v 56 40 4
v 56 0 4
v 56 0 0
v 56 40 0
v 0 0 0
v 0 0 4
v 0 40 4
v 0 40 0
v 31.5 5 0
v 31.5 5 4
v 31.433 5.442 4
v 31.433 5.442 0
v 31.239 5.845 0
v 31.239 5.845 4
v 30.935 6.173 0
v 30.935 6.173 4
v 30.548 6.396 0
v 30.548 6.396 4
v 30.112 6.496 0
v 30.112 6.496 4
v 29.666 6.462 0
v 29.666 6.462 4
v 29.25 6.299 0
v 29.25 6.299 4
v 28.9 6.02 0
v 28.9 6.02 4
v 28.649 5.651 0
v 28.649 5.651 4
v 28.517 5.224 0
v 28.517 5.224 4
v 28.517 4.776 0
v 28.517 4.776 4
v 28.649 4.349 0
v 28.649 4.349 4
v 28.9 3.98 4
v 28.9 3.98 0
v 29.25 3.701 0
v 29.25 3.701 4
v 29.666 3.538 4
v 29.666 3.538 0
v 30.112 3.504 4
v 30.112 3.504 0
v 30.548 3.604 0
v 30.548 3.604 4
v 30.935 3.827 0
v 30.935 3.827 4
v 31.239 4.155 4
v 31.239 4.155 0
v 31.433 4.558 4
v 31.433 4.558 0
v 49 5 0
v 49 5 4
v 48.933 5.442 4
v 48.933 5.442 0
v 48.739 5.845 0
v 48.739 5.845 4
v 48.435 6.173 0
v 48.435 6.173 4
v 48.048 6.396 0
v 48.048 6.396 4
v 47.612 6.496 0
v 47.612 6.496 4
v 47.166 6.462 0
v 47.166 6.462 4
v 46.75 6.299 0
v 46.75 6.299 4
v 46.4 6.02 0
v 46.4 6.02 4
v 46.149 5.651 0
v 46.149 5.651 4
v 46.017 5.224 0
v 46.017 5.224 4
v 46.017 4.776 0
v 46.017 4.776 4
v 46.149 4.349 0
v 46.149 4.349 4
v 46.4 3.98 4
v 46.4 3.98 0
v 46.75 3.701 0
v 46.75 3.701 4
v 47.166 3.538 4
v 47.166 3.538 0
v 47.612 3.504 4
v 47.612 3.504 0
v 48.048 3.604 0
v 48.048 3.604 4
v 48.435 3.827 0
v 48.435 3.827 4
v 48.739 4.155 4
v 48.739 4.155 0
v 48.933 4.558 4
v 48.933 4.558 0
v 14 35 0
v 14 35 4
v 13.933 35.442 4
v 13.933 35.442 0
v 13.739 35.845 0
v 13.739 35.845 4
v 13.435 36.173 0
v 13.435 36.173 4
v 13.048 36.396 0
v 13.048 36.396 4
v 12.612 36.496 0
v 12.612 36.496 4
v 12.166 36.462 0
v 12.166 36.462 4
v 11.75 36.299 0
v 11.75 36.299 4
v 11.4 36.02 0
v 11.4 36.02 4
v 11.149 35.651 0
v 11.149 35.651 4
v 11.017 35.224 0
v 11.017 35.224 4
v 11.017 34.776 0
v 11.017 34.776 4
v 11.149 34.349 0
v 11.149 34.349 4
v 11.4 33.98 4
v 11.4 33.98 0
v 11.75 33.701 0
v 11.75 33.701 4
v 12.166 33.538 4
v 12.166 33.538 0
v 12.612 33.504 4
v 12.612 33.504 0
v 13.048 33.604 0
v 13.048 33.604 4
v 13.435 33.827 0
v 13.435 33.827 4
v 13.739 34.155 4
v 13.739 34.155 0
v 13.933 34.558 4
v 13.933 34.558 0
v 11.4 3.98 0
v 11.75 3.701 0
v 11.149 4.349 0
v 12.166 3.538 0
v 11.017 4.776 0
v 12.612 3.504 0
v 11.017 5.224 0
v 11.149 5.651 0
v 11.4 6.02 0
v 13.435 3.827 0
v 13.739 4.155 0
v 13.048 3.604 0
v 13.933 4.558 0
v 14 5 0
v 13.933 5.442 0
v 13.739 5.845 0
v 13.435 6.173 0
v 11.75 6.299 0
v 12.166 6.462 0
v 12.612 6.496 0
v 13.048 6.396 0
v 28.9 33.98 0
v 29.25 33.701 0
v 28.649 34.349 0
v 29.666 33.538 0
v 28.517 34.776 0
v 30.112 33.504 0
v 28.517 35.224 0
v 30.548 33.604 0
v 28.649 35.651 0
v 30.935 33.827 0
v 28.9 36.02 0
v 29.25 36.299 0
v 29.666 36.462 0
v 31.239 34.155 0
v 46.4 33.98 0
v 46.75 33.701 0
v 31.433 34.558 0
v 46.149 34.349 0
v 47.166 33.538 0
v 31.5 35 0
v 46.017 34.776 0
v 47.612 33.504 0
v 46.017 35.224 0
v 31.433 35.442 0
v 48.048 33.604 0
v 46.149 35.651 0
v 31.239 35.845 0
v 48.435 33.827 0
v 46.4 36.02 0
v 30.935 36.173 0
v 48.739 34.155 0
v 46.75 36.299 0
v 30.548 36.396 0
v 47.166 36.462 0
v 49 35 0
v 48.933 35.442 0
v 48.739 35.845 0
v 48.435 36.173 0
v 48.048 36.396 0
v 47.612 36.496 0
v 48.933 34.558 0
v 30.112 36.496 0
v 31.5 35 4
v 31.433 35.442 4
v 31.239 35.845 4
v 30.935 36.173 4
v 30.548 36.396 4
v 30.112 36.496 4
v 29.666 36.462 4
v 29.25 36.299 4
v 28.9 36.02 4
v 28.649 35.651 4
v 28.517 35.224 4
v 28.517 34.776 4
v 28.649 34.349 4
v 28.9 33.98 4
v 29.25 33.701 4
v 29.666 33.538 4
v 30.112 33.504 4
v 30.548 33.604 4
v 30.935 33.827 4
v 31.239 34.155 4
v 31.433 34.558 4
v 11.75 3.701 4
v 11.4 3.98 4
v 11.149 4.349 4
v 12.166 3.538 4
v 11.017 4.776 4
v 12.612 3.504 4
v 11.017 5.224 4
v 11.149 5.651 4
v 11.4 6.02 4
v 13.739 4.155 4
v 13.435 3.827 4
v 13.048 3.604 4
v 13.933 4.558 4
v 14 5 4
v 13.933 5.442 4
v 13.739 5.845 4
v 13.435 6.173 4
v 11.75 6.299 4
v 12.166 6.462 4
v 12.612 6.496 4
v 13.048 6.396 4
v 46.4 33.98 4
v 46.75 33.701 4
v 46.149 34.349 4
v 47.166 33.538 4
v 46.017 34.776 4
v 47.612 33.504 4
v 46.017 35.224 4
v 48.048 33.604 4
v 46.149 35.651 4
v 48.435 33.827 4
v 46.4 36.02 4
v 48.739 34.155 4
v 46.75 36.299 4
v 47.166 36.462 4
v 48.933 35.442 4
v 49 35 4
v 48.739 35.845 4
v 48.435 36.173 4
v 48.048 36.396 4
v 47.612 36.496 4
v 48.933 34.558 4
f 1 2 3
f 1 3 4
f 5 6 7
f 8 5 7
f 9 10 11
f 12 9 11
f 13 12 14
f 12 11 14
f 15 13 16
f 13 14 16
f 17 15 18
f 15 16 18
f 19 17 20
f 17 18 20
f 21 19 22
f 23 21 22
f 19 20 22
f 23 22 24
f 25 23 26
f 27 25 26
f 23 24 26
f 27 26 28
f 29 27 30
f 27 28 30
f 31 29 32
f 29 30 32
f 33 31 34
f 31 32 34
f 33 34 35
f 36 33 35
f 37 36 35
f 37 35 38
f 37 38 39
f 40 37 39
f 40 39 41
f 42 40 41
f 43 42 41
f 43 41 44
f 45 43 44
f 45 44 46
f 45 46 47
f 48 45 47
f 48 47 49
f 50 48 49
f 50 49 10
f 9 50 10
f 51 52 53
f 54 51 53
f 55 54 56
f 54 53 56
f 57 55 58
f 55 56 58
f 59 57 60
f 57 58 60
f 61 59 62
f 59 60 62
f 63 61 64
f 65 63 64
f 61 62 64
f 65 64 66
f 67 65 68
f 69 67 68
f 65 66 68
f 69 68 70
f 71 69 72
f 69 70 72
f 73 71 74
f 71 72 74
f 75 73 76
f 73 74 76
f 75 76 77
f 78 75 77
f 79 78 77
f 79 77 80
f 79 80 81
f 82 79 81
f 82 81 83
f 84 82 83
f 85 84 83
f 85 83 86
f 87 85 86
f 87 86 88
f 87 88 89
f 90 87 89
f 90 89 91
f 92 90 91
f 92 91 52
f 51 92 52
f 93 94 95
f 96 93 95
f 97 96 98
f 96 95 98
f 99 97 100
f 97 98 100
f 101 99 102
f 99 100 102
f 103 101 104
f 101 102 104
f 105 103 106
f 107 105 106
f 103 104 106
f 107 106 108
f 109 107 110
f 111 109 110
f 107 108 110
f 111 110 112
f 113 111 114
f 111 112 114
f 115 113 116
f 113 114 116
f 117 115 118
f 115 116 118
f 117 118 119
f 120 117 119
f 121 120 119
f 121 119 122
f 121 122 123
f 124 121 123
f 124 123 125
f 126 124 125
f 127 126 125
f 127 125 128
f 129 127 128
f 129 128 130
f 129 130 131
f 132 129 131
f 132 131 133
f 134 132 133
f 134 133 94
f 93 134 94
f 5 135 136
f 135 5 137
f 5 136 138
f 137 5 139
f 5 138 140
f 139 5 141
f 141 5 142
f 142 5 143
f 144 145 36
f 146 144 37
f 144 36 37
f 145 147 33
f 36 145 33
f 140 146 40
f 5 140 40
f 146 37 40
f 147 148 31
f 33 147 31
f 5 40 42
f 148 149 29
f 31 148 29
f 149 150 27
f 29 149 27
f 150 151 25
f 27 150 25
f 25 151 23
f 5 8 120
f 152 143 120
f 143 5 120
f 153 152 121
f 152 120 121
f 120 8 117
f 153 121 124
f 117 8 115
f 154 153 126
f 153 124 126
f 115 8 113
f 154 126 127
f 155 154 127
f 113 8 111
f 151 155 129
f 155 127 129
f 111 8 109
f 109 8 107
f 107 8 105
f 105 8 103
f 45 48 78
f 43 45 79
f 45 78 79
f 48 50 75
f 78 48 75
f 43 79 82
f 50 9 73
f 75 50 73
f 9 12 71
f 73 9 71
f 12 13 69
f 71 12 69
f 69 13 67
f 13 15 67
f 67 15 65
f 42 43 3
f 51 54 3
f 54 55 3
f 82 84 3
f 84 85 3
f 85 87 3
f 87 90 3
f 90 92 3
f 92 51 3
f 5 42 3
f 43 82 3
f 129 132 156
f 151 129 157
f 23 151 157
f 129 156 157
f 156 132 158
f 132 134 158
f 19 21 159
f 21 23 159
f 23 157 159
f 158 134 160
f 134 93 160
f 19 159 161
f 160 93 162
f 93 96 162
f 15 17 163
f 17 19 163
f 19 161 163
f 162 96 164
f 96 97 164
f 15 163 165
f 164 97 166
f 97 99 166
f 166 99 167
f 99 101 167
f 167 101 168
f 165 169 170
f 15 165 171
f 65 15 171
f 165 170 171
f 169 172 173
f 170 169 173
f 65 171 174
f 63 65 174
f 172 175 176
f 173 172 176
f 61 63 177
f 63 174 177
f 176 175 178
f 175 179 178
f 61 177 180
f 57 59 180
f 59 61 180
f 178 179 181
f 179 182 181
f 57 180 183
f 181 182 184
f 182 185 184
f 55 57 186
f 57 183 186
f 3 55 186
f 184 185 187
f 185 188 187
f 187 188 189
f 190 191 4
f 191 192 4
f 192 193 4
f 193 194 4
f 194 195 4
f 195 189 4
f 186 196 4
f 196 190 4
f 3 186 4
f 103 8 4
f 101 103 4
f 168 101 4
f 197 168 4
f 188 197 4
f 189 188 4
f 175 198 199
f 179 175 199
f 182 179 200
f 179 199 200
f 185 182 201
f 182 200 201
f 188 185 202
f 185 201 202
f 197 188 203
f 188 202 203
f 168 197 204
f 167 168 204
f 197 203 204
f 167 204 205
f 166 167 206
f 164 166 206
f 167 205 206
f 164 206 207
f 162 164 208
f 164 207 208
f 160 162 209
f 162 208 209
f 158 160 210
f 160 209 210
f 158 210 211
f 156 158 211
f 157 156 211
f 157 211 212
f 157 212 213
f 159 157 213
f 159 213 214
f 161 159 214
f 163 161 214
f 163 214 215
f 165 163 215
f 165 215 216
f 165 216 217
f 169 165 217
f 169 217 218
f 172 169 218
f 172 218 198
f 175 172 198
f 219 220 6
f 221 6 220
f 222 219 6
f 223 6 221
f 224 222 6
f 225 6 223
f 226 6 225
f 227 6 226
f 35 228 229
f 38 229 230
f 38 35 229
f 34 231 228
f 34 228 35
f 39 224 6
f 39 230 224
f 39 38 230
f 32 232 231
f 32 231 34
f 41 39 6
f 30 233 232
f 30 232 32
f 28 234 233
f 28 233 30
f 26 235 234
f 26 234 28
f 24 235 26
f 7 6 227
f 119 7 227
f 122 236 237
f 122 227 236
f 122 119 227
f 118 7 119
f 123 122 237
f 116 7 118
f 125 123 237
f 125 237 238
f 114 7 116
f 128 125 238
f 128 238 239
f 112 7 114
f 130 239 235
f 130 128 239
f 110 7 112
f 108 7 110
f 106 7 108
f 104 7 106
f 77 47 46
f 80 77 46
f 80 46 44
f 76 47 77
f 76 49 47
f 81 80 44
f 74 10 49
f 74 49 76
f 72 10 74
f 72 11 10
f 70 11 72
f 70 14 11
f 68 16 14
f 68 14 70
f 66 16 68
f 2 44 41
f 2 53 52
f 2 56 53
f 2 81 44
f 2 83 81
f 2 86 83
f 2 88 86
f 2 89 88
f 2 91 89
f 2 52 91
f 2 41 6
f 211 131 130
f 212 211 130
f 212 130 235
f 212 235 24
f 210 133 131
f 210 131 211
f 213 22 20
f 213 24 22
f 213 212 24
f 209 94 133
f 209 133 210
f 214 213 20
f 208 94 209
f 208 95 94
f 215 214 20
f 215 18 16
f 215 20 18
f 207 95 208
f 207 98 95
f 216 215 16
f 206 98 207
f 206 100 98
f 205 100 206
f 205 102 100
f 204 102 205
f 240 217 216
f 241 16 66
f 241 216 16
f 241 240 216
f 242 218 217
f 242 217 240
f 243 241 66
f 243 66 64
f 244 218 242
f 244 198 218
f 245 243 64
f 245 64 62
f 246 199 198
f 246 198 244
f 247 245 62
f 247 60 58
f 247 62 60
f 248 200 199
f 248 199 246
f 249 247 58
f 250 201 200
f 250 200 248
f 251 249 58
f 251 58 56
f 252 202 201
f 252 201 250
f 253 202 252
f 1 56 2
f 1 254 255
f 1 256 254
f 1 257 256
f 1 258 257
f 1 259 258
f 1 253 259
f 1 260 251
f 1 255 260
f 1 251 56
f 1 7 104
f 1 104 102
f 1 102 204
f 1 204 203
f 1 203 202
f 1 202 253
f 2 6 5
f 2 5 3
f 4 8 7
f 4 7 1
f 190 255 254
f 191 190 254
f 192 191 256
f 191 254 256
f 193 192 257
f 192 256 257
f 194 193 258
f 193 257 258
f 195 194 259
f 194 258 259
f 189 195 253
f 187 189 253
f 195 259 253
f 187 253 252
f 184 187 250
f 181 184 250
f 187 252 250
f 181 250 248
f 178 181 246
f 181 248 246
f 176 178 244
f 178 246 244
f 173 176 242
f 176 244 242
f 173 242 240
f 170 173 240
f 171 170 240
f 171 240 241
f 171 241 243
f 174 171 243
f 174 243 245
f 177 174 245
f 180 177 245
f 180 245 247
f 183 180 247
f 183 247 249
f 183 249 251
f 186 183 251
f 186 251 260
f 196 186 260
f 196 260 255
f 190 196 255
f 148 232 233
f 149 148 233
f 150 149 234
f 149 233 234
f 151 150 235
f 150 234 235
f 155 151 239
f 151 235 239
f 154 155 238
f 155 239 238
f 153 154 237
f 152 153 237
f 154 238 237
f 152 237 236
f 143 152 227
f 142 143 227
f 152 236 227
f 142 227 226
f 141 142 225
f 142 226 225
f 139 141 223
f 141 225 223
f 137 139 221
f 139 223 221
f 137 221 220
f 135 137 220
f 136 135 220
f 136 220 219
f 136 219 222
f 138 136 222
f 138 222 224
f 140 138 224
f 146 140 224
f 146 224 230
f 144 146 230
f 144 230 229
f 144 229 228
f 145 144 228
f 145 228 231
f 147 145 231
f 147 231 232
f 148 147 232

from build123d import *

# Parameters (mm, degrees)
SKETCH1_W           = 56
SKETCH1_H           = 40
BOSS_EXTRUDE1_DEPTH = 4
SKETCH3_W           = 56
SKETCH3_H           = 3
CUT_EXTRUDE2_DEPTH  = 2
SKETCH4_R           = 1.5
CUT_EXTRUDE3_DEPTH  = 5
SKETCH5_W           = 56
SKETCH5_H           = 3
BOSS_EXTRUDE2_DEPTH = 2


with BuildPart() as part:
    # Sketch1 → Boss-Extrude1 (new body)
    with BuildSketch(Plane.XY):
        with Locations((28, 20)):
            Rectangle(SKETCH1_W, SKETCH1_H)
    extrude(amount=BOSS_EXTRUDE1_DEPTH)

    # Sketch3 → Cut-Extrude2 (cut)
    with BuildSketch(Plane.XY.offset(4)):
        with Locations((28, 1.5)):
            Rectangle(SKETCH3_W, SKETCH3_H)
    extrude(amount=-CUT_EXTRUDE2_DEPTH, mode=Mode.SUBTRACT)

    # Sketch4 → Cut-Extrude3 (cut, through all)
    with BuildSketch(Plane.XY.offset(4)):
        with Locations((47.5, 5)):
            Circle(SKETCH4_R)
        with Locations((30, 5)):
            Circle(SKETCH4_R)
        with Locations((12.5, 5)):
            Circle(SKETCH4_R)
        with Locations((47.5, 35)):
            Circle(SKETCH4_R)
        with Locations((30, 35)):
            Circle(SKETCH4_R)
        with Locations((12.5, 35)):
            Circle(SKETCH4_R)
    extrude(amount=-CUT_EXTRUDE3_DEPTH, mode=Mode.SUBTRACT)

    # Sketch5 → Boss-Extrude2 (add)
    with BuildSketch(Plane.XY.offset(4)):
        with Locations((28, 1.5)):
            Rectangle(SKETCH5_W, SKETCH5_H)
    extrude(amount=-BOSS_EXTRUDE2_DEPTH)


solid = part.part
